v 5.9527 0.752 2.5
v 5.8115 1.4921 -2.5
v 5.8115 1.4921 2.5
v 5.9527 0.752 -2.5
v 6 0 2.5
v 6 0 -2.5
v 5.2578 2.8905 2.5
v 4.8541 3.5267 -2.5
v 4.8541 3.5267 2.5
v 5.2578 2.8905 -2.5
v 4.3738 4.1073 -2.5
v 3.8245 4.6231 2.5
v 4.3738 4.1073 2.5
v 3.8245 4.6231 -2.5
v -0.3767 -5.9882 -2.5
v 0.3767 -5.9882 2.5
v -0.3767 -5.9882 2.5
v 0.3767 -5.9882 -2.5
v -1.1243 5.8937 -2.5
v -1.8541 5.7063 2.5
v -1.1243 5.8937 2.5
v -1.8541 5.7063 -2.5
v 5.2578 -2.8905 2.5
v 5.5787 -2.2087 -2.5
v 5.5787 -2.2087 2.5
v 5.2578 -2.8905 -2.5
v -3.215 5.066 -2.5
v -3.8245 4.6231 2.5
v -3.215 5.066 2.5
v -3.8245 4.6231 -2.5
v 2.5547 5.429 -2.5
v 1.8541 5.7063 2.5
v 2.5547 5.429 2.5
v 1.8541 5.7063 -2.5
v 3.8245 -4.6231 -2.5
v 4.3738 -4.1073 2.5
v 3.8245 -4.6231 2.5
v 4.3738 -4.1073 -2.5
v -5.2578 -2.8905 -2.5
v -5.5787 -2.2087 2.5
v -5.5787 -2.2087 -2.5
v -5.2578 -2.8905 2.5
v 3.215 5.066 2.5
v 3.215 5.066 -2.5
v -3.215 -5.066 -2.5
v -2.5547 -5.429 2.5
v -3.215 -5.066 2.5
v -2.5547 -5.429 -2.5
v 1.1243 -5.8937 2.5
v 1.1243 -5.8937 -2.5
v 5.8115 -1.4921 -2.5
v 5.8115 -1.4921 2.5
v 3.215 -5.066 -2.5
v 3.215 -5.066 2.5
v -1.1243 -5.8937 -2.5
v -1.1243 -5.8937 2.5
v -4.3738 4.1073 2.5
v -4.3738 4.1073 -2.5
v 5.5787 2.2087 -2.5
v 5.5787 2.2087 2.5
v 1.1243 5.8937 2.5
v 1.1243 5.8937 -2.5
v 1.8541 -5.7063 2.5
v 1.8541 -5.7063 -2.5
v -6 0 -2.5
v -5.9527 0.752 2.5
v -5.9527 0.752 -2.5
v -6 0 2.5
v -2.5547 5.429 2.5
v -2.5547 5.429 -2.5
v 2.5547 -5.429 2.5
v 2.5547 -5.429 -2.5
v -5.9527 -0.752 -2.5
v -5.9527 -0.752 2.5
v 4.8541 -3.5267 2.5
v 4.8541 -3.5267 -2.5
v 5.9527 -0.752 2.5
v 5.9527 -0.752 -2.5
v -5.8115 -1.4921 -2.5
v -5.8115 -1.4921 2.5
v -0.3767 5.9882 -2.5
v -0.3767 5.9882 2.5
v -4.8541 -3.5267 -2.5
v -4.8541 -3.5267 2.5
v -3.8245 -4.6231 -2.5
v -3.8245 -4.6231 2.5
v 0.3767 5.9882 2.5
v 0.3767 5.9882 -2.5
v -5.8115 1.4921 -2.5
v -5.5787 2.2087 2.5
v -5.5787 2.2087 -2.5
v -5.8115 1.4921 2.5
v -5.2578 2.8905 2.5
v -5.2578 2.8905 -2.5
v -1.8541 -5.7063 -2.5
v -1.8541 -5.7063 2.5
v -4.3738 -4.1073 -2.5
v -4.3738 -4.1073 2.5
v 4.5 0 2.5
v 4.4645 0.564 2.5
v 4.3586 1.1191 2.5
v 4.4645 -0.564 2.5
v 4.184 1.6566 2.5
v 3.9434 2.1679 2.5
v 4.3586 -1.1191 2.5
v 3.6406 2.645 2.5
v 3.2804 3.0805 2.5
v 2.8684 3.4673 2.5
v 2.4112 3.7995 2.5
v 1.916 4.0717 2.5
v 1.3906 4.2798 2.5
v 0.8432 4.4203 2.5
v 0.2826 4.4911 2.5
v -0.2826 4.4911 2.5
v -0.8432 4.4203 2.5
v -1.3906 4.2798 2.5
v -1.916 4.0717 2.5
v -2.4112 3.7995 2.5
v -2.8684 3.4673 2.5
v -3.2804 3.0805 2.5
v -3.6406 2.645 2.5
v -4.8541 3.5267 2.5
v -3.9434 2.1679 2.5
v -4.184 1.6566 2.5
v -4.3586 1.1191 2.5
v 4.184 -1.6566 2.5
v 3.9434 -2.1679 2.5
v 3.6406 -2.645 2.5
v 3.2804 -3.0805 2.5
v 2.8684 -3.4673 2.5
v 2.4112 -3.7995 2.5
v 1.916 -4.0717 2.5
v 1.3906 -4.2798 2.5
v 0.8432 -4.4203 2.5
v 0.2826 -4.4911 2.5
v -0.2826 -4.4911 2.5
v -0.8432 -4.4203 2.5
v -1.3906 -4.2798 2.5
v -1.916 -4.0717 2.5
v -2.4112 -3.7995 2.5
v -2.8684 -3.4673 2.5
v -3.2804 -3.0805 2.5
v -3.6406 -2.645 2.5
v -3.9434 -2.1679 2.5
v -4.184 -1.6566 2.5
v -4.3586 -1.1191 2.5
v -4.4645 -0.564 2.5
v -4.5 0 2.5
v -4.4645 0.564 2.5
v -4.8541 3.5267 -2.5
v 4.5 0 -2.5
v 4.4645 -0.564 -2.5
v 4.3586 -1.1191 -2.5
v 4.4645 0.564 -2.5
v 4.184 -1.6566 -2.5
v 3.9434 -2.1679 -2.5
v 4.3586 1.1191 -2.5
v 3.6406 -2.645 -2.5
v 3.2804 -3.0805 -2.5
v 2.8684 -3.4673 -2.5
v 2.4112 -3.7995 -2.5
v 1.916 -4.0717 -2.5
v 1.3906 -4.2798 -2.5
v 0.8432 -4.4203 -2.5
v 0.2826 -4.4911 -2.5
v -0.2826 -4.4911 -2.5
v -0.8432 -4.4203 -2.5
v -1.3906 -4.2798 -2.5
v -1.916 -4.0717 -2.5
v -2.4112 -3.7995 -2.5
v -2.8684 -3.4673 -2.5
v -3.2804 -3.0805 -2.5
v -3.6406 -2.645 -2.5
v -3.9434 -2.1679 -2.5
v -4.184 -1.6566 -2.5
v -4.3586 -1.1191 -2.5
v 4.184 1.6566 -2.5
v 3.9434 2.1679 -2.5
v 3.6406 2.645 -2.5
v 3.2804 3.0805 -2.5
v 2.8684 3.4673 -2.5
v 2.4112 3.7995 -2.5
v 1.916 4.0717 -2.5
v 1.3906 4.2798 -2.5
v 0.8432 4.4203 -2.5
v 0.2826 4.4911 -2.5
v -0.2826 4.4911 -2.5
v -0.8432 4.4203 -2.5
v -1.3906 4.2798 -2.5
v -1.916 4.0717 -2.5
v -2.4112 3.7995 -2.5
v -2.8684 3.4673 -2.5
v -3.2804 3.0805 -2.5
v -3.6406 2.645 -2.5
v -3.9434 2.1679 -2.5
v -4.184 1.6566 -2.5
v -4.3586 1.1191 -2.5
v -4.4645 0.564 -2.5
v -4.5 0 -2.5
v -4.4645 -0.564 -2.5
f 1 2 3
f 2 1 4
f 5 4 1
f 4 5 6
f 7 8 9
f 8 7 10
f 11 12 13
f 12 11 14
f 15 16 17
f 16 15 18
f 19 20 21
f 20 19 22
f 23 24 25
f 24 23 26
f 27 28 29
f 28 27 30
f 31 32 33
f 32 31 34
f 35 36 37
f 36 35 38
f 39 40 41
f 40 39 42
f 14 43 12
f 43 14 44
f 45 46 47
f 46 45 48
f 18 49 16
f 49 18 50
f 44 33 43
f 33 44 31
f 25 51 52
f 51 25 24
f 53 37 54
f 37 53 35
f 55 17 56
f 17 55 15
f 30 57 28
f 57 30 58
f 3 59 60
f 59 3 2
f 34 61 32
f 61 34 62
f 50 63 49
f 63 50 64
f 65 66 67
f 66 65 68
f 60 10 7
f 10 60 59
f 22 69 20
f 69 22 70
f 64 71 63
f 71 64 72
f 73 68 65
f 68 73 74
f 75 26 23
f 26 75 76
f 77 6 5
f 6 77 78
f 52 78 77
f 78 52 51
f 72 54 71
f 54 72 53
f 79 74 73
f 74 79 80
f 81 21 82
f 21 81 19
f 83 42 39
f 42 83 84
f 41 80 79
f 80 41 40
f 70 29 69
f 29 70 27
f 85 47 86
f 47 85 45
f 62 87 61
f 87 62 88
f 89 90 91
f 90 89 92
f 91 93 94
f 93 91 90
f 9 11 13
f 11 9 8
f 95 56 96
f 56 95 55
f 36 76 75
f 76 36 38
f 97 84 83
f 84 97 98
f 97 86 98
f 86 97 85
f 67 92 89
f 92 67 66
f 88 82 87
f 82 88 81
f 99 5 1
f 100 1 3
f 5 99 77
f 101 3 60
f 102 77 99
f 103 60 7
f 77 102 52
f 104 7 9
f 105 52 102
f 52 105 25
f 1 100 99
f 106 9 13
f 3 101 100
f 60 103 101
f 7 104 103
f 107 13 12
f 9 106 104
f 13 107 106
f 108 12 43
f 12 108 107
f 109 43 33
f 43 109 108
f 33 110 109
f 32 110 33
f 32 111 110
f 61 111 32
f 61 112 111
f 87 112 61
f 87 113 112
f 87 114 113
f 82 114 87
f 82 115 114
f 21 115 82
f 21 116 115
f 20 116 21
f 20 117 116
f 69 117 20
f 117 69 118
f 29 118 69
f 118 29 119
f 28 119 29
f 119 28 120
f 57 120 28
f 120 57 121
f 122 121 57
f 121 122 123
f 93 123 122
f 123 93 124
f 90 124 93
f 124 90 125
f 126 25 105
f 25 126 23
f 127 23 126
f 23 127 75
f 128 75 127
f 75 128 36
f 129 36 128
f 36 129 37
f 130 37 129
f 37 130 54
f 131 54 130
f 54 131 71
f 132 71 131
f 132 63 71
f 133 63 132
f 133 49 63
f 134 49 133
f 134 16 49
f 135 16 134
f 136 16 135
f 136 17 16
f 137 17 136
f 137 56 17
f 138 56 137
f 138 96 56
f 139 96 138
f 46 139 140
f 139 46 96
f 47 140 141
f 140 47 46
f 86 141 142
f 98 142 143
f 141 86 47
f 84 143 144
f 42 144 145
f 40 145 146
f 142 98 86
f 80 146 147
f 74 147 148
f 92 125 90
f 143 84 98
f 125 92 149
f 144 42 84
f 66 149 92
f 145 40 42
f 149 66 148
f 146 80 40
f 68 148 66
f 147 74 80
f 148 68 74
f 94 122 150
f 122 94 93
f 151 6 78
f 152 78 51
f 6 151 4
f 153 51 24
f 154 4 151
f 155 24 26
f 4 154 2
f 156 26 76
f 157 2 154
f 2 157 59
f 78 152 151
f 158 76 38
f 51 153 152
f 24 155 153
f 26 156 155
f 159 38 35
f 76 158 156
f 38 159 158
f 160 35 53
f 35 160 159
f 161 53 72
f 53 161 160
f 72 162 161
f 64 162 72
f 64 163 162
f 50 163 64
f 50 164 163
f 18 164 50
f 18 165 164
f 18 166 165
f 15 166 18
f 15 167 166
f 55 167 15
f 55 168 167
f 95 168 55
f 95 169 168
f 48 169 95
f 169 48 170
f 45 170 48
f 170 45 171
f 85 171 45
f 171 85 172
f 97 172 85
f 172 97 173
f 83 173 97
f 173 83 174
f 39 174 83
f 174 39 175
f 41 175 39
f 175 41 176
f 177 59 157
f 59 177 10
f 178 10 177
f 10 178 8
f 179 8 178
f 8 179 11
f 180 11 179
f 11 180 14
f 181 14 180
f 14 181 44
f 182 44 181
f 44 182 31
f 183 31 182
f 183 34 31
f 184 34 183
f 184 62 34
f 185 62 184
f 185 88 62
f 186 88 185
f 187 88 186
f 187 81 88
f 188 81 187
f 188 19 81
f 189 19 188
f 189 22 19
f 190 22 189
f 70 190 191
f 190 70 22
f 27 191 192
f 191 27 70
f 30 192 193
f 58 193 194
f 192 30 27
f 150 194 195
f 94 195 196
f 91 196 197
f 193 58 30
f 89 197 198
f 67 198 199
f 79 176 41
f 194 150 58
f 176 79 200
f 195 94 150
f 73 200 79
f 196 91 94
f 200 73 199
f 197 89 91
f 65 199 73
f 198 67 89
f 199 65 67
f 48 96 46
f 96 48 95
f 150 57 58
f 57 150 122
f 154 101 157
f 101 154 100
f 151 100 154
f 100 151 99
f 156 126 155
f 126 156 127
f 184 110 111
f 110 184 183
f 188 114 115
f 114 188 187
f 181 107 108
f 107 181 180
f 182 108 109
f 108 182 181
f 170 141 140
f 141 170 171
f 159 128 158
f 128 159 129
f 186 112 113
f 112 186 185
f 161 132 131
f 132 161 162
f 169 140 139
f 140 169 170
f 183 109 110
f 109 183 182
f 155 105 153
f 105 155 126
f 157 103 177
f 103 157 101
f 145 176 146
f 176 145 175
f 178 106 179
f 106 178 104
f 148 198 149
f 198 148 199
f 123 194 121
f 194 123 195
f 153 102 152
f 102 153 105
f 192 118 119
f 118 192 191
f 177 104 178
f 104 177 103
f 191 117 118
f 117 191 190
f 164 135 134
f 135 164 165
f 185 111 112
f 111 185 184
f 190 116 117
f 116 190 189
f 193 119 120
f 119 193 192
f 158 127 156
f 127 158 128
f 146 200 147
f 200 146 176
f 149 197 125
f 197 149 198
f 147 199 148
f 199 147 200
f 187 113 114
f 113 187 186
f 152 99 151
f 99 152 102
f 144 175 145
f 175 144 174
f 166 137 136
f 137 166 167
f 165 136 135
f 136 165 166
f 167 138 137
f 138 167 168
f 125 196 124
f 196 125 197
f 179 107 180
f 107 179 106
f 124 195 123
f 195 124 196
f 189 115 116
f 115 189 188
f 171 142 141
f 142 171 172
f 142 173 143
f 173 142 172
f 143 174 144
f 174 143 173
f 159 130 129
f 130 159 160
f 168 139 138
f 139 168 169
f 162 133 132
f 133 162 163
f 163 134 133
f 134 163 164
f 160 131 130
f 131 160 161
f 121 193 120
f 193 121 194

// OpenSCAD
$fn = 50;


difference() {
	union() {
		translate(v = [0, 0, -2.5000000000]) {
			cylinder(h = 5, r = 6.0000000000);
		}
	}
	union() {
		translate(v = [0, 0, -100.0000000000]) {
			cylinder(h = 200, r = 4.5000000000);
		}
	}
}
